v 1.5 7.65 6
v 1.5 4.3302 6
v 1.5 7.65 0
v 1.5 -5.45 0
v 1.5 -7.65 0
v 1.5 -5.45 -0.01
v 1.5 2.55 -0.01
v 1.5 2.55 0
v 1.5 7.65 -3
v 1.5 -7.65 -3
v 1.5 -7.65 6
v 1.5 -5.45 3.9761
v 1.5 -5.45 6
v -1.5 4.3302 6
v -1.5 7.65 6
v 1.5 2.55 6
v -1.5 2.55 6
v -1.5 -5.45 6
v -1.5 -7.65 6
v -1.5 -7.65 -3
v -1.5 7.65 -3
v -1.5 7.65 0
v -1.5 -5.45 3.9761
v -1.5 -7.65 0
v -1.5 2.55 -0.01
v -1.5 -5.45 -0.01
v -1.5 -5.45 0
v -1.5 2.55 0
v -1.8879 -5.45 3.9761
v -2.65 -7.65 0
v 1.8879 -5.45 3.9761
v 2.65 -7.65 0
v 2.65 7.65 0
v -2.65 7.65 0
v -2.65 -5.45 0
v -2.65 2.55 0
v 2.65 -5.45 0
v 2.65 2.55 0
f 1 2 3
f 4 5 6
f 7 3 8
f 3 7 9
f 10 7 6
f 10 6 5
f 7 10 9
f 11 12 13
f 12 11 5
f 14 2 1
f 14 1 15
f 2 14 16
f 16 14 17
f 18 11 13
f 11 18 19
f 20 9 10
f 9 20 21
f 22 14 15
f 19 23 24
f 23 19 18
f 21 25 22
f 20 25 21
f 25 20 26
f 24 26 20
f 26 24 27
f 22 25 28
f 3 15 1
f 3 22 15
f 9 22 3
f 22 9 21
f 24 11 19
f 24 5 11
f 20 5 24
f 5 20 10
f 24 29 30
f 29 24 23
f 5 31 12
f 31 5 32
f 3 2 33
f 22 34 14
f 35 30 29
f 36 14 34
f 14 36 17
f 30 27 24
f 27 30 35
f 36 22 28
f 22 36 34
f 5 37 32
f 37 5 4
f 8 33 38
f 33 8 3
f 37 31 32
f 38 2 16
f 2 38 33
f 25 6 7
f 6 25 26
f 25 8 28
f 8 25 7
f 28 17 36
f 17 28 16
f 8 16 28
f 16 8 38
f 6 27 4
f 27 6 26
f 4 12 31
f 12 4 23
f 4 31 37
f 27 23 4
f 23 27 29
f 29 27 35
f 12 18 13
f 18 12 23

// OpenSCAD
$fa = 1;
$fs = 0.2;

rod_diameter = 1.6;
tolerance = 0.1;

total_length = 15.3;
base_width = 5.3;
hole_width = 3;
hole_length = 13.65;
inner_length = 8;
from_outer_edge_to_inner = 2.2;
plate_thickness = 1.5;
under_plate = 1.5;
height_above_plate = 6;
total_height = height_above_plate + plate_thickness + under_plate;

sqrt2 = sqrt(2);

difference() {
  translate([0, 0, total_height / 2 - plate_thickness - under_plate])
    union() {
      cube([hole_width, total_length, total_height], center = true);

      translate([0, 0, (total_height - height_above_plate) / 2])
        scale([1, total_length / base_width, 1])
          rotate([0, 0, 45])
            cylinder(height_above_plate, base_width / sqrt2, hole_width / sqrt2, $fn = 4, center = true);
    }

  translate([0, (inner_length - total_length) / 2 + from_outer_edge_to_inner, height_above_plate / 2 + 0.99])
    cube([base_width * 2, inner_length, height_above_plate + 2], center = true);
}
